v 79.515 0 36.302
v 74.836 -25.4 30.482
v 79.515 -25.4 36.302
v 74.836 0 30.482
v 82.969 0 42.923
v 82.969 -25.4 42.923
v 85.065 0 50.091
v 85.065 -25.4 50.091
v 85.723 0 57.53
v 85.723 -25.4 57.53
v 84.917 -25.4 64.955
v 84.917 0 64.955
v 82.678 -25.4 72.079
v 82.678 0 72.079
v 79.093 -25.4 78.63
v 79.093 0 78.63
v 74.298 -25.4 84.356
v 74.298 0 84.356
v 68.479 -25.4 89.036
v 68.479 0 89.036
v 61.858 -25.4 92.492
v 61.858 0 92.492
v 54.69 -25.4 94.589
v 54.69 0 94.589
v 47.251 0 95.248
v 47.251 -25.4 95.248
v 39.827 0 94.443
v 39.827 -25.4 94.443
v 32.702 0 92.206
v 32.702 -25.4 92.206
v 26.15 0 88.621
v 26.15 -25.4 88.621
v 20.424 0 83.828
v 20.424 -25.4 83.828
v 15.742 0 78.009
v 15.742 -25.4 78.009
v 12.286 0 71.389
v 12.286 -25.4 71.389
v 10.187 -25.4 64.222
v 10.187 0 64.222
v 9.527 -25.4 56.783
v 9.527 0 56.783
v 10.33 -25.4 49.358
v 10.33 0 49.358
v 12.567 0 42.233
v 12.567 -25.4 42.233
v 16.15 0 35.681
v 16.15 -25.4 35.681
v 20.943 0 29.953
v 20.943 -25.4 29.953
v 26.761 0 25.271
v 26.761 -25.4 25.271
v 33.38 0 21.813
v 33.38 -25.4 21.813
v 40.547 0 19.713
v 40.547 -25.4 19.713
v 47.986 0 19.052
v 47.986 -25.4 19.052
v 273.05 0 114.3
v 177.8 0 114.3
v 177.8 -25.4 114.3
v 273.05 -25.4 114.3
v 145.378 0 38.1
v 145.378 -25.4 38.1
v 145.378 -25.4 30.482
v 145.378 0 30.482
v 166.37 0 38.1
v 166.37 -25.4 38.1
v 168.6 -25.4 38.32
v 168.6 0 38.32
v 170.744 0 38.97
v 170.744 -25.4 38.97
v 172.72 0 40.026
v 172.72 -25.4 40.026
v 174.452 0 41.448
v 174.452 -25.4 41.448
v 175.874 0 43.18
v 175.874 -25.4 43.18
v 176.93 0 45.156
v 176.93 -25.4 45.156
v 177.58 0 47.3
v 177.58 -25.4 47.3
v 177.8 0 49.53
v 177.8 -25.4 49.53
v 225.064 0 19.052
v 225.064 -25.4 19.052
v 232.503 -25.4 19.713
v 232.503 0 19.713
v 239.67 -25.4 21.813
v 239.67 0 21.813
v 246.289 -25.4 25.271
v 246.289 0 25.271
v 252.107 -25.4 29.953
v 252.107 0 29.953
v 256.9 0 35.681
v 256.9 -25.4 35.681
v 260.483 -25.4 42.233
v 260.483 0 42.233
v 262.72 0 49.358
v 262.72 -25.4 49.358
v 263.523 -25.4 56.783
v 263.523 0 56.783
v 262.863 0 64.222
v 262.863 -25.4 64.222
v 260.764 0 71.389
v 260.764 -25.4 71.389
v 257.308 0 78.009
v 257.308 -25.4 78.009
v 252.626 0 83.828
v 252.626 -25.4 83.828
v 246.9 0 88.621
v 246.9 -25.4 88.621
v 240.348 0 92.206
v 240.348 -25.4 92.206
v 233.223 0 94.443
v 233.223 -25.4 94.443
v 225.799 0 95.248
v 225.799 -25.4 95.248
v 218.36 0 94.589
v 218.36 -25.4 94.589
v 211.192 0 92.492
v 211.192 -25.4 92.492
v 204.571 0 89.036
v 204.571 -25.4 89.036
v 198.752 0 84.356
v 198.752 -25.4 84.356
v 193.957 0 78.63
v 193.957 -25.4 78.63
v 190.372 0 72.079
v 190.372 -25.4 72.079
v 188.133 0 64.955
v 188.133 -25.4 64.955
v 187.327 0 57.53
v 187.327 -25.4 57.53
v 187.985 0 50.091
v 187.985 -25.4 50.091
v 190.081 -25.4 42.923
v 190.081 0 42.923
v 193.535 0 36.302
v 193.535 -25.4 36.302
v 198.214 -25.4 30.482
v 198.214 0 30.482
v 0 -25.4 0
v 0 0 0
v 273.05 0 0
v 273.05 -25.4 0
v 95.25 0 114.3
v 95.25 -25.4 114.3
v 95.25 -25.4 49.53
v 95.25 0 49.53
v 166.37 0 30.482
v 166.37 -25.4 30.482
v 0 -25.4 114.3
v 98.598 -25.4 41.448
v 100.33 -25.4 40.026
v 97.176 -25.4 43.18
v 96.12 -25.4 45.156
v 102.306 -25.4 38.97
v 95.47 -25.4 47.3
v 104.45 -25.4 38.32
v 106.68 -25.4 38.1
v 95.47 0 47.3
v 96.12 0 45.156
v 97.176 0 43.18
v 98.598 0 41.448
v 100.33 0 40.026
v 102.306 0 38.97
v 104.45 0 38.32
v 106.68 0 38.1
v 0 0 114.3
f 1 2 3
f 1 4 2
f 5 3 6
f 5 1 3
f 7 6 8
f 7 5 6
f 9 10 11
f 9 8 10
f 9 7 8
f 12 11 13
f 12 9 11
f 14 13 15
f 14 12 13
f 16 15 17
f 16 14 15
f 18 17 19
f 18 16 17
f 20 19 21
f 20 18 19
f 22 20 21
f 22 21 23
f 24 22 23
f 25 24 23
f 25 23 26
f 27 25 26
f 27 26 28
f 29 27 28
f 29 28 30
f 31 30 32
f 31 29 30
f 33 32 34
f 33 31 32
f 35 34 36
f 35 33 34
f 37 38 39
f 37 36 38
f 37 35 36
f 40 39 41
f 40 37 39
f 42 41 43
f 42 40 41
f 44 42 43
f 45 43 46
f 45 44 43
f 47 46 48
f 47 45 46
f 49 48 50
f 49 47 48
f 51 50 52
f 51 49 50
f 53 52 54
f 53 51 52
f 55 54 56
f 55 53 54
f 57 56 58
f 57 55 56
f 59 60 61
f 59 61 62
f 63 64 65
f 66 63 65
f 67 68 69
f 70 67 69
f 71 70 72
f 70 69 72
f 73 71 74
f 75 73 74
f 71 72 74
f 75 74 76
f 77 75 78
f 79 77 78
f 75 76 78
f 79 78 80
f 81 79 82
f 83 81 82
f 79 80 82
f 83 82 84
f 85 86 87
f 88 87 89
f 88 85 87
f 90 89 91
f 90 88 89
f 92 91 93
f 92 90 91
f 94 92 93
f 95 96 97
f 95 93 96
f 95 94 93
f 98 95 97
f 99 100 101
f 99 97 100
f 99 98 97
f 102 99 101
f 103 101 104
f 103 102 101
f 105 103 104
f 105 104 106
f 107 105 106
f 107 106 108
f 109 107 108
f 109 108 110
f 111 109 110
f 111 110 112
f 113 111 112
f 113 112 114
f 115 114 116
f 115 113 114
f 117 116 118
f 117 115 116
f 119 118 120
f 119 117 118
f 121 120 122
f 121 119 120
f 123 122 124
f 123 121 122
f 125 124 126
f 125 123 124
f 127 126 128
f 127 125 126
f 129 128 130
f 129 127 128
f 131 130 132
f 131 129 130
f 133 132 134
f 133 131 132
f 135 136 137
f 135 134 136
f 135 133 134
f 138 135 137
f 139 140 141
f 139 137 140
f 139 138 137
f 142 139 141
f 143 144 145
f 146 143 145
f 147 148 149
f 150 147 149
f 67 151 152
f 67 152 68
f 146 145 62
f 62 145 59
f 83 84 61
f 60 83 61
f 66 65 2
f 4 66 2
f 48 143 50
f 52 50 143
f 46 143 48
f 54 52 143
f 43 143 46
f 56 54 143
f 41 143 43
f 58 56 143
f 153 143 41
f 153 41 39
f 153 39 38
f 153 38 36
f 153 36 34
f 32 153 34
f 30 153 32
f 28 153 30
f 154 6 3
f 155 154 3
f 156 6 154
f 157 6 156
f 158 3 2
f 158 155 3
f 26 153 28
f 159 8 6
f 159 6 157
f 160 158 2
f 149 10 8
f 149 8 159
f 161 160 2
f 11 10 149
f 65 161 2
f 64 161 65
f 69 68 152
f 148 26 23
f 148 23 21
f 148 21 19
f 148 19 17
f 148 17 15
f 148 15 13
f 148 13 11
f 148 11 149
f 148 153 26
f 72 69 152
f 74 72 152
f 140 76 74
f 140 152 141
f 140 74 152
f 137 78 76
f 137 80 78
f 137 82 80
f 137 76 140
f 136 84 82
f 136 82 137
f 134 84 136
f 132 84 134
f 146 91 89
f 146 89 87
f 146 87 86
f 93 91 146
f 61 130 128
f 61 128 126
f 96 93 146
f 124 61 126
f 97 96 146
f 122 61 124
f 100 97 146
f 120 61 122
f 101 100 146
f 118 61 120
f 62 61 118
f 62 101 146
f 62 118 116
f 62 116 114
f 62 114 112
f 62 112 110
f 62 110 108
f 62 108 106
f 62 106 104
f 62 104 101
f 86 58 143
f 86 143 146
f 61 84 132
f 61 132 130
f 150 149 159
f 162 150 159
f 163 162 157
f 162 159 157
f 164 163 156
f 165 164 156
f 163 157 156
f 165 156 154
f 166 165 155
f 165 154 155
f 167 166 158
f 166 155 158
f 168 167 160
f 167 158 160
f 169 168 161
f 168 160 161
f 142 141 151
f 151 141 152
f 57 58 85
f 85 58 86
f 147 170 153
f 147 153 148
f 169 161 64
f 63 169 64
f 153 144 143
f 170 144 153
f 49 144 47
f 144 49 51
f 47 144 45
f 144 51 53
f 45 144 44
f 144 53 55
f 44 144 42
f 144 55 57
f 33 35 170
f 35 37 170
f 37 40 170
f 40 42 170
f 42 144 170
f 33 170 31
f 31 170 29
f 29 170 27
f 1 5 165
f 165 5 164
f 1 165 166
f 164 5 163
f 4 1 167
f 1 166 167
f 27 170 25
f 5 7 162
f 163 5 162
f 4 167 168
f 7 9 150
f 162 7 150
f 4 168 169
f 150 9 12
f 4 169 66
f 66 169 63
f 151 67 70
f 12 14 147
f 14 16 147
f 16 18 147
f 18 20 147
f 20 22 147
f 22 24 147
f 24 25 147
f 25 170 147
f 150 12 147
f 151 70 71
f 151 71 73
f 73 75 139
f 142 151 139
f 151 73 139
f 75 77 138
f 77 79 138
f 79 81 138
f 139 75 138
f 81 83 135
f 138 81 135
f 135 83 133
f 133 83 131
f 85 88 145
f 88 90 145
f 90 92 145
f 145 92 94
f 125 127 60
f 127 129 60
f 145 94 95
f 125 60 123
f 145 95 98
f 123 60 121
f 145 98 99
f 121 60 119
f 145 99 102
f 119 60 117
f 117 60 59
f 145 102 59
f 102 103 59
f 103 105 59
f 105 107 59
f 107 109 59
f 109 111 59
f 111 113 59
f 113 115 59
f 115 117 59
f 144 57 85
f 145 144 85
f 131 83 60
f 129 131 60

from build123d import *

# Parameters (mm, degrees)
F0_W     = 273.05
F0_H     = 114.3
F0_R     = 38.1
F1_DEPTH = 25.4
F3_DEPTH = 25.4
F5_DEPTH = 25.4


with BuildPart() as f1:
    # F0 (on Front) → F1 (new body)
    with BuildSketch(Plane.XZ):
        with Locations((136.525, 57.15)):
            Rectangle(F0_W, F0_H)
        with Locations((47.625, 57.15)):
            Circle(F0_R, mode=Mode.SUBTRACT)
        with Locations((225.425, 57.15)):
            Circle(F0_R, mode=Mode.SUBTRACT)
    extrude(amount=F1_DEPTH)

    # F2 (on face) → F3 (cut)
    with BuildSketch(Plane.XZ.offset(25.4)):
        with BuildLine():
            Line((177.8, 114.3), (95.25, 114.3))
            Line((95.25, 114.3), (95.25, 49.53))
            ThreePointArc((95.25, 49.53), (98.597769, 41.447769), (106.68, 38.1))
            Line((106.68, 38.1), (166.37, 38.1))
            ThreePointArc((166.37, 38.1), (174.452231, 41.447769), (177.8, 49.53))
            Line((177.8, 49.53), (177.8, 114.3))
        make_face()
    extrude(amount=-F3_DEPTH, mode=Mode.SUBTRACT)

    # F4 (on face) → F5 (cut)
    with BuildSketch(Plane.XZ.offset(25.4)):
        Polygon((166.37, 30.481706), (166.37, 38.1), (145.37774, 38.1), (145.37774, 30.481706), (74.835515, 30.481706), (47.264424, 19.051706), (225.064424, 19.051706), (198.214485, 30.481706), align=None)
    extrude(amount=-F5_DEPTH, mode=Mode.SUBTRACT)


solid = f1.part
